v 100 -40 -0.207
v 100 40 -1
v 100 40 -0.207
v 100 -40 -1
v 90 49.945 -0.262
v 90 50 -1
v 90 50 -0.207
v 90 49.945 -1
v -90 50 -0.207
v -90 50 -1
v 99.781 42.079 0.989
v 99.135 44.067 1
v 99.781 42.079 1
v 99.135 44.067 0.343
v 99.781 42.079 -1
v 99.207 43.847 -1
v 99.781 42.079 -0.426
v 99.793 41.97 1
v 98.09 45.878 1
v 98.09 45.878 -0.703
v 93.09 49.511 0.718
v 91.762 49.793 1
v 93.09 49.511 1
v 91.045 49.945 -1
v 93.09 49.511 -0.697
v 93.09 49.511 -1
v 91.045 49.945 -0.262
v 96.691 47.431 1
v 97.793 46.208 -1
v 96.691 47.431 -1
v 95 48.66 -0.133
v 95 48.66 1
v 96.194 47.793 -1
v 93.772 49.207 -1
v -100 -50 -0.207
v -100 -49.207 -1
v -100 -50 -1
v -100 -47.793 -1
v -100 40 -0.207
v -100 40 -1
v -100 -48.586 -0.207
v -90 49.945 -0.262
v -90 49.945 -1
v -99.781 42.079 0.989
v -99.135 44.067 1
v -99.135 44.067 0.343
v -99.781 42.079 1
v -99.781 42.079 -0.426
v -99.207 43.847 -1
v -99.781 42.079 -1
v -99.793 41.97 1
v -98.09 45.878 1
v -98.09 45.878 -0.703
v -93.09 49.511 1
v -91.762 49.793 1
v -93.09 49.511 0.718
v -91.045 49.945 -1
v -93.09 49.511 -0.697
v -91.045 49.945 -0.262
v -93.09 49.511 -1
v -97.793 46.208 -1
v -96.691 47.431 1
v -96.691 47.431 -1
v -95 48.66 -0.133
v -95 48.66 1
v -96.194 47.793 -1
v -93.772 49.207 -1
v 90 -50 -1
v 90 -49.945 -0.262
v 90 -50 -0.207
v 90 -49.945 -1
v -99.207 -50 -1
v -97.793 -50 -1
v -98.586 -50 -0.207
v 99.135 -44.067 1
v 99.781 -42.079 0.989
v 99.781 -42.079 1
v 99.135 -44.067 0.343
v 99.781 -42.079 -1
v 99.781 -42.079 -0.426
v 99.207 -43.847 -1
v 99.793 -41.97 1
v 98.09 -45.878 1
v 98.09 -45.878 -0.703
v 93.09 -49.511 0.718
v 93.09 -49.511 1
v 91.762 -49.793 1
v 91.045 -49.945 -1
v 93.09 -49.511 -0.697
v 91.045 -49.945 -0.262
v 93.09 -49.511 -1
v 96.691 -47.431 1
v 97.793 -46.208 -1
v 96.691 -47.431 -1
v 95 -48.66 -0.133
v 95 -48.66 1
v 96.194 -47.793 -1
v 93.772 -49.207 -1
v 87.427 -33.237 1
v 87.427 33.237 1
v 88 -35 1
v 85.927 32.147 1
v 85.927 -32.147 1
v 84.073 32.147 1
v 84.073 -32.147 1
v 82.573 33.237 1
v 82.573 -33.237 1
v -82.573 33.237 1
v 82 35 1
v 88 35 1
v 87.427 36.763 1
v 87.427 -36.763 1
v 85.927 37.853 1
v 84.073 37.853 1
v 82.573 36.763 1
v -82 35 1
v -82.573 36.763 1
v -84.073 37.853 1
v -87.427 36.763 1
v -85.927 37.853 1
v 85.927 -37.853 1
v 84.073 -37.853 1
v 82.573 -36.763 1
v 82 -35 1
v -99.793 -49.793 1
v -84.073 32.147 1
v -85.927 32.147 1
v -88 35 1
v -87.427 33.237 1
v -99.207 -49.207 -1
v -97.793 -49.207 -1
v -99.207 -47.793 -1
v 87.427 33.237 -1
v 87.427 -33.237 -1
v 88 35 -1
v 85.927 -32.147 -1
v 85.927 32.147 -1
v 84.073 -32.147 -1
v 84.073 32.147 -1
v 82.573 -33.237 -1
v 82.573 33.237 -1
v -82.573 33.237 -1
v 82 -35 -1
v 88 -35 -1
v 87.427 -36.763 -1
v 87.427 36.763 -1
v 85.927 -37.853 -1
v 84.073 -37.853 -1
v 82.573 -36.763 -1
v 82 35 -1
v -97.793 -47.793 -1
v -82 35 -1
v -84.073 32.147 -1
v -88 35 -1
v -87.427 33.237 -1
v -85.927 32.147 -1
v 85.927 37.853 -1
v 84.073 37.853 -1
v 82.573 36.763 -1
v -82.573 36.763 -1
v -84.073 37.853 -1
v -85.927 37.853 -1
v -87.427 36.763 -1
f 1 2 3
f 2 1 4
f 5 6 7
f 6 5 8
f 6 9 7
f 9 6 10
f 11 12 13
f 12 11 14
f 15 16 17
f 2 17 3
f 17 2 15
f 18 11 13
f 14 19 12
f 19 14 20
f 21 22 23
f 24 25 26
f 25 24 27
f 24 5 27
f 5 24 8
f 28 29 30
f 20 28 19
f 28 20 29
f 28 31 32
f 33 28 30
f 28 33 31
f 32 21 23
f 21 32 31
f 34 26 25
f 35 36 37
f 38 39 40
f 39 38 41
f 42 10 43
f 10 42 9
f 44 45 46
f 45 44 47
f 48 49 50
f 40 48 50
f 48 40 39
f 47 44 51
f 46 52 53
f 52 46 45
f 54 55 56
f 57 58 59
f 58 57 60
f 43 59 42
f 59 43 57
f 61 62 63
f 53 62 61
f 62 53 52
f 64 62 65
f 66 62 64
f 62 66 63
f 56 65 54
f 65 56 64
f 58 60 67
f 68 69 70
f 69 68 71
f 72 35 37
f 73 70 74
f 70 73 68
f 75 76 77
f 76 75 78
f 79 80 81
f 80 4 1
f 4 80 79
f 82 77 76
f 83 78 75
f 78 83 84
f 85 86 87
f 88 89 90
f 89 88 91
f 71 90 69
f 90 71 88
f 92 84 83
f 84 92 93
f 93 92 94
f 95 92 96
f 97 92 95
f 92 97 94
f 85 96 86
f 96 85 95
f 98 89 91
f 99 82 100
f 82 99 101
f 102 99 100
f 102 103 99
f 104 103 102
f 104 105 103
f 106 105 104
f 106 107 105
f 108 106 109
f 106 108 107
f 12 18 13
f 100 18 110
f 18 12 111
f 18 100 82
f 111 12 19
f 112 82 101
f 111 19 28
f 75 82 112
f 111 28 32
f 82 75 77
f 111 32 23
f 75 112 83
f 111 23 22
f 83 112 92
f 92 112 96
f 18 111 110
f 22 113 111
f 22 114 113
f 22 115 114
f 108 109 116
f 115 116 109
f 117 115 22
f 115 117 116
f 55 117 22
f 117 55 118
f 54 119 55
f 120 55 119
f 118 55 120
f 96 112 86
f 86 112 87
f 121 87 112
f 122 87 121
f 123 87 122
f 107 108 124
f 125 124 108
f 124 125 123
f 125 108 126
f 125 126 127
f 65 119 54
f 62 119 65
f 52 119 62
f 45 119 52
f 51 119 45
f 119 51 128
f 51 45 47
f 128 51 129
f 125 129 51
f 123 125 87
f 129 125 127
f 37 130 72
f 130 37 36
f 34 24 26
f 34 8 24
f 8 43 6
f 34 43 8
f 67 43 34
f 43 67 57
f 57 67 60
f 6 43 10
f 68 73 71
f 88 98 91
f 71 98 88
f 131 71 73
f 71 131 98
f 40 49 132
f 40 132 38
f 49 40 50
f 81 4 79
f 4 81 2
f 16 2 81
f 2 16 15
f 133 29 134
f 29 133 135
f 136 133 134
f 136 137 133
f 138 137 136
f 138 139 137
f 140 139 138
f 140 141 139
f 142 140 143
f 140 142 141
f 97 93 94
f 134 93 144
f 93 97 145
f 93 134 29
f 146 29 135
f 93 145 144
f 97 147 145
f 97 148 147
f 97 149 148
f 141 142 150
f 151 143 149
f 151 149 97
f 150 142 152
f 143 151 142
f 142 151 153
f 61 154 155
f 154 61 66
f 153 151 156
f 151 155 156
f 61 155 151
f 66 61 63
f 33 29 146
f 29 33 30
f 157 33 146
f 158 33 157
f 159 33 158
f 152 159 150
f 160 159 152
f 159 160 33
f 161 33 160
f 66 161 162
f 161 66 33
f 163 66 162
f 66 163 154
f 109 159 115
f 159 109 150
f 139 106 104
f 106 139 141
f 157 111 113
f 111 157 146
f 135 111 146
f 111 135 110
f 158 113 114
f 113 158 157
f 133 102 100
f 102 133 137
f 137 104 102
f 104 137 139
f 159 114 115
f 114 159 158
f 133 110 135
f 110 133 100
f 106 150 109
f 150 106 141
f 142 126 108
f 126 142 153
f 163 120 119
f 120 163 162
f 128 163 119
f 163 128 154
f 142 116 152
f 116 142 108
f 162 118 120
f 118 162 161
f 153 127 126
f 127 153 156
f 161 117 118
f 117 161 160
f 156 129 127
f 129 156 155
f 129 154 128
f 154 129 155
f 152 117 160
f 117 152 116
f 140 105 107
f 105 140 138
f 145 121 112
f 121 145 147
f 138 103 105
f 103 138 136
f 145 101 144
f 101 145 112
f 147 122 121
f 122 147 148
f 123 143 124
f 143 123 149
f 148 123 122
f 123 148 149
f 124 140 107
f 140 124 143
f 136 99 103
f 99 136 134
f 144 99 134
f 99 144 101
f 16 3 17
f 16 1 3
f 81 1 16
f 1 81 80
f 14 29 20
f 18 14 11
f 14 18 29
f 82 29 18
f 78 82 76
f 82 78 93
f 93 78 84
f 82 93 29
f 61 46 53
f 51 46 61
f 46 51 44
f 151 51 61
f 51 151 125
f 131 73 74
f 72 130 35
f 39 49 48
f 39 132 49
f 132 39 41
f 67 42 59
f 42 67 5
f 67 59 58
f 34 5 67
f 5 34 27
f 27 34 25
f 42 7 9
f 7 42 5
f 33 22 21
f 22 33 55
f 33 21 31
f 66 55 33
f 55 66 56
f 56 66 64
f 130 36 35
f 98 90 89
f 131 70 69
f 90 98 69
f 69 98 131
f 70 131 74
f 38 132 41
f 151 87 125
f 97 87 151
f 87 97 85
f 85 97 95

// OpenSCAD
// Parameters
sheet_L = 200; //[100:400:1]
sheet_W = 100; //[50:200:1]
sheet_T = 2; //[1:4:0.5]
corner_R = 10; //[5:20:1]
hole_d = 6; //[3:12:0.5]
hole_edge_offset = 15; //[8:30:1]
chamfer_size = 1; //[0.5:3:0.25]
overlap = 1; //[0.5:2:0.5]

// Base Shapes
module sheet_body() {
  translate([0, 0, 0])
    cube([sheet_L, sheet_W, sheet_T], center=true);
}

module corner_rounds_cyl() {
  translate([sheet_L/2 - corner_R, sheet_W/2 - corner_R, 0])
    cylinder(h=sheet_T + 2*overlap, r=corner_R, center=true);
}

module corner_rounds_square() {
  translate([sheet_L/2 - corner_R/2, sheet_W/2 - corner_R/2, 0])
    cube([corner_R, corner_R, sheet_T + 2*overlap], center=true);
}

module mounting_holes_cyl() {
  translate([sheet_L/2 - hole_edge_offset, sheet_W/2 - hole_edge_offset, 0])
    cylinder(h=sheet_T + 2*overlap, r=hole_d/2, center=true);
}

module edge_chamfer_wedge_x() {
  translate([sheet_L/2 - chamfer_size/2, 0, 0])
    rotate([0, 45, 0])
      cube([chamfer_size, sheet_W + 2*overlap, sheet_T + 2*overlap], center=true);
}

module edge_chamfer_wedge_y() {
  translate([0, sheet_W/2 - chamfer_size/2, 0])
    rotate([-45, 0, 0])
      cube([sheet_L + 2*overlap, chamfer_size, sheet_T + 2*overlap], center=true);
}

// Operations
module corner_rounds_quadrant() {
  difference() {
    corner_rounds_square();
    corner_rounds_cyl();
  }
}

module corner_rounds() {
  union() {
    corner_rounds_quadrant();
    mirror([1, 0, 0]) corner_rounds_quadrant();
    mirror([0, 1, 0]) corner_rounds_quadrant();
    mirror([1, 1, 0]) corner_rounds_quadrant();
  }
}

module mounting_holes() {
  union() {
    mounting_holes_cyl();
    mirror([1, 0, 0]) mounting_holes_cyl();
    mirror([0, 1, 0]) mounting_holes_cyl();
    mirror([1, 1, 0]) mounting_holes_cyl();
  }
}

module edge_chamfer() {
  union() {
    edge_chamfer_wedge_x();
    mirror([1, 0, 0]) edge_chamfer_wedge_x();
    edge_chamfer_wedge_y();
    mirror([0, 1, 0]) edge_chamfer_wedge_y();
  }
}

// Final Model
module complete_model() {
  difference() {
    difference() {
      difference() {
        sheet_body();
        corner_rounds();
      }
      mounting_holes();
    }
    edge_chamfer();
  }
}

// Render the complete model
color("DimGray") complete_model();
